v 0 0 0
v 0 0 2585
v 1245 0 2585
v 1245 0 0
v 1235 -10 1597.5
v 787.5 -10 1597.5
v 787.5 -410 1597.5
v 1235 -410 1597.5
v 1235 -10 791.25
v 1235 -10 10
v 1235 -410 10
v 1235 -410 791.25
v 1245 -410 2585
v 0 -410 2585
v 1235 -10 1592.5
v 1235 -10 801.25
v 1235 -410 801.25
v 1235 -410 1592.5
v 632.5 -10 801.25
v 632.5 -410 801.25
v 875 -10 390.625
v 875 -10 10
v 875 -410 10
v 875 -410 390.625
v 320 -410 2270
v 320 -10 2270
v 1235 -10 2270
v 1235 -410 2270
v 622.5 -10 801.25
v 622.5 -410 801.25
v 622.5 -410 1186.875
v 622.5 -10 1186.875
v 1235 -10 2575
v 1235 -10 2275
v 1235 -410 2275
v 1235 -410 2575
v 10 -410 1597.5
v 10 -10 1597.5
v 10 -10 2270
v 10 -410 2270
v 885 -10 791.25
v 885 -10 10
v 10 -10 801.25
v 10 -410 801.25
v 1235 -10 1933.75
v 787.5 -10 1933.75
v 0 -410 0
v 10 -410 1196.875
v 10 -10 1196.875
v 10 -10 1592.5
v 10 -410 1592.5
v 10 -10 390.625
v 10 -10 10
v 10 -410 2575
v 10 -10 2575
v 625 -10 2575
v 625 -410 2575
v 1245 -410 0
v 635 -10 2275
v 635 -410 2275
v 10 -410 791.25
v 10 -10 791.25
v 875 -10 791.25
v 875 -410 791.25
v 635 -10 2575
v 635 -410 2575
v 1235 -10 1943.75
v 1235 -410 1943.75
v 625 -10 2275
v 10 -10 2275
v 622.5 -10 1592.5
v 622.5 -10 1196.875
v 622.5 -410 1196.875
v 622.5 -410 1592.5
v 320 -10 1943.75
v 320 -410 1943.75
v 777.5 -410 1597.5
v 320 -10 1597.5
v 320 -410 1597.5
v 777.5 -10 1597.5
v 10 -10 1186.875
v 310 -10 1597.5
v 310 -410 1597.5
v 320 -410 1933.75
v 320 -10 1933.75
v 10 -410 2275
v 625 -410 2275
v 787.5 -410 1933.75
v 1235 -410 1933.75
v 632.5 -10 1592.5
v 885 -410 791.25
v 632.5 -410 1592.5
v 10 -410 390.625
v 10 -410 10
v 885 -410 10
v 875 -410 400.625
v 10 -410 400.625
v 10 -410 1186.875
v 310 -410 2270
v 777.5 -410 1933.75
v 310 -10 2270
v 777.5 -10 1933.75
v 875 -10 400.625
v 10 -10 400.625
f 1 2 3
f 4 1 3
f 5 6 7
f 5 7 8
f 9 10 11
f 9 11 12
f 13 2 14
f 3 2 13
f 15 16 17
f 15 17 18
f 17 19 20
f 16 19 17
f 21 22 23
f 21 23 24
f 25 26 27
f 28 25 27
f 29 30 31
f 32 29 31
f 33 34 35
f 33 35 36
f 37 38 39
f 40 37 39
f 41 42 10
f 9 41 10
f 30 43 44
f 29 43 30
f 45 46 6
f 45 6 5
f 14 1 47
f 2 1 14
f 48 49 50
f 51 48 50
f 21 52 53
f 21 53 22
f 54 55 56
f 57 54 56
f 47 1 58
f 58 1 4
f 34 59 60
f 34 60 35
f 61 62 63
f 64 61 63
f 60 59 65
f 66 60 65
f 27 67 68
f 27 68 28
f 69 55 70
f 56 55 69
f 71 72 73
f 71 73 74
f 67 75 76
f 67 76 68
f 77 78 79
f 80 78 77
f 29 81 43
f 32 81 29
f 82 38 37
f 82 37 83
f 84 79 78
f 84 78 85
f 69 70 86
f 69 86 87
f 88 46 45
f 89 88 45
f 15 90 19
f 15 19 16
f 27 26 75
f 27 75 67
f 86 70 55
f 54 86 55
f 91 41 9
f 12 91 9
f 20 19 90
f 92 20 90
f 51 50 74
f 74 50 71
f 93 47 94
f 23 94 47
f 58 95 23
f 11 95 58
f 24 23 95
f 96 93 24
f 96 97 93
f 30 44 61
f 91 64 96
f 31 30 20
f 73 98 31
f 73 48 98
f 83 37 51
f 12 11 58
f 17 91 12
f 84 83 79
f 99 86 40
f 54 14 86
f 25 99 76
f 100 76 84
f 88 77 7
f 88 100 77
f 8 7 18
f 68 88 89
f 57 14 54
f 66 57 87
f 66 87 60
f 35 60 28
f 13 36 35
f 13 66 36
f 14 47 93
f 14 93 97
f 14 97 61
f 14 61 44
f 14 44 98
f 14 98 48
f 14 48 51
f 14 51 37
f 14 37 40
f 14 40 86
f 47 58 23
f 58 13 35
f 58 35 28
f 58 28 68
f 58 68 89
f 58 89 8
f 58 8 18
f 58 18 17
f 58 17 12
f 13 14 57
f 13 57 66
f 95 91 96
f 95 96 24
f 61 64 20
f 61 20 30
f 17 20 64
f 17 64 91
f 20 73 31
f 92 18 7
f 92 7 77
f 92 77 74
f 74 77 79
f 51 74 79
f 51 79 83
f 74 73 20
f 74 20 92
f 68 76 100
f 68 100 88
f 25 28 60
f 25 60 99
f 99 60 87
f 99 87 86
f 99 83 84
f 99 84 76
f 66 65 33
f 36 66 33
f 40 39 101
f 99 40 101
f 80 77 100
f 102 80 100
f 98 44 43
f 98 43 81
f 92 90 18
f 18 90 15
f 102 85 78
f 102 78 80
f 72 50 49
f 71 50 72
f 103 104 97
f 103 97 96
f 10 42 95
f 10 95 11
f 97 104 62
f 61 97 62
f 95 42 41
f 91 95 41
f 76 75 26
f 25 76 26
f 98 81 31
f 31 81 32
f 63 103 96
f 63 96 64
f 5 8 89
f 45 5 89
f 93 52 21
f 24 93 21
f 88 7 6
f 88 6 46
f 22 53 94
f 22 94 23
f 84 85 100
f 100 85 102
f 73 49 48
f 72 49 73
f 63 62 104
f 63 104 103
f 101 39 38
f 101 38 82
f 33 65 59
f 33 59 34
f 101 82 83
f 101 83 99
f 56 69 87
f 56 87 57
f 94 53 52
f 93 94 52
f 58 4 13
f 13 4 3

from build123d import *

# Parameters (mm, degrees)
F0_W      = 1245
F0_H      = 2585
F1_DEPTH  = 410
F2_T      = -10
F3_W      = 1225
F3_H      = 5
F4_DEPTH  = 400
F5_W      = 10
F5_H      = 672.5
F6_DEPTH  = 400
F7_W      = 915
F7_H      = 10
F8_DEPTH  = 400
F9_W      = 10
F9_H      = 300
F10_DEPTH = 400
F11_W     = 10
F11_H     = 336.25
F12_DEPTH = 400
F13_W     = 1225
F13_H     = 10
F14_DEPTH = 400
F15_W     = 10
F15_H     = 791.25
F16_DEPTH = 400
F17_W     = 612.5
F17_H     = 10
F18_DEPTH = 400
F19_W     = 10
F19_H     = 781.25
F20_DEPTH = 400
F21_W     = 865
F21_H     = 10
F22_DEPTH = 400


with BuildPart() as f1:
    # F0 (on Front) → F1 (new body)
    with BuildSketch(Plane.XZ):
        with Locations((622.5, 1292.5)):
            Rectangle(F0_W, F0_H)
    extrude(amount=F1_DEPTH)

    # F2
    f2_openings = [f1.faces().sort_by_distance(p)[0] for p in [
        (622.5, -410, 1292.5),
    ]]
    offset(amount=F2_T, openings=f2_openings)

    # F3 (on face) → F4 (join)
    with BuildSketch(Plane.XZ.offset(10)):
        with Locations((622.5, 2272.5)):
            Rectangle(F3_W, F3_H)
        with Locations((622.5, 1595)):
            Rectangle(F3_W, F3_H)
    extrude(amount=F4_DEPTH)

    # F5 (on face) → F6 (join)
    with BuildSketch(Plane.XZ.offset(10)):
        with Locations((315, 1933.75)):
            Rectangle(F5_W, F5_H)
    extrude(amount=F6_DEPTH)

    # F7 (on face) → F8 (join)
    with BuildSketch(Plane.XZ.offset(10)):
        with Locations((777.5, 1938.75)):
            Rectangle(F7_W, F7_H)
    extrude(amount=F8_DEPTH)

    # F9 (on face) → F10 (join)
    with BuildSketch(Plane.XZ.offset(10)):
        with Locations((630, 2425)):
            Rectangle(F9_W, F9_H)
    extrude(amount=F10_DEPTH)

    # F11 (on face) → F12 (join)
    with BuildSketch(Plane.XZ.offset(10)):
        with Locations((782.5, 1765.625)):
            Rectangle(F11_W, F11_H)
    extrude(amount=F12_DEPTH)

    # F13 (on face) → F14 (join)
    with BuildSketch(Plane.XZ.offset(10)):
        with Locations((622.5, 796.25)):
            Rectangle(F13_W, F13_H)
    extrude(amount=F14_DEPTH)

    # F15 (on face) → F16 (join)
    with BuildSketch(Plane.XZ.offset(10)):
        with Locations((627.5, 1196.875)):
            Rectangle(F15_W, F15_H)
    extrude(amount=F16_DEPTH)

    # F17 (on face) → F18 (join)
    with BuildSketch(Plane.XZ.offset(10)):
        with Locations((316.25, 1191.875)):
            Rectangle(F17_W, F17_H)
    extrude(amount=F18_DEPTH)

    # F19 (on face) → F20 (join)
    with BuildSketch(Plane.XZ.offset(10)):
        with Locations((880, 400.625)):
            Rectangle(F19_W, F19_H)
    extrude(amount=F20_DEPTH)

    # F21 (on face) → F22 (join)
    with BuildSketch(Plane.XZ.offset(10)):
        with Locations((442.5, 395.625)):
            Rectangle(F21_W, F21_H)
    extrude(amount=F22_DEPTH)


solid = f1.part
